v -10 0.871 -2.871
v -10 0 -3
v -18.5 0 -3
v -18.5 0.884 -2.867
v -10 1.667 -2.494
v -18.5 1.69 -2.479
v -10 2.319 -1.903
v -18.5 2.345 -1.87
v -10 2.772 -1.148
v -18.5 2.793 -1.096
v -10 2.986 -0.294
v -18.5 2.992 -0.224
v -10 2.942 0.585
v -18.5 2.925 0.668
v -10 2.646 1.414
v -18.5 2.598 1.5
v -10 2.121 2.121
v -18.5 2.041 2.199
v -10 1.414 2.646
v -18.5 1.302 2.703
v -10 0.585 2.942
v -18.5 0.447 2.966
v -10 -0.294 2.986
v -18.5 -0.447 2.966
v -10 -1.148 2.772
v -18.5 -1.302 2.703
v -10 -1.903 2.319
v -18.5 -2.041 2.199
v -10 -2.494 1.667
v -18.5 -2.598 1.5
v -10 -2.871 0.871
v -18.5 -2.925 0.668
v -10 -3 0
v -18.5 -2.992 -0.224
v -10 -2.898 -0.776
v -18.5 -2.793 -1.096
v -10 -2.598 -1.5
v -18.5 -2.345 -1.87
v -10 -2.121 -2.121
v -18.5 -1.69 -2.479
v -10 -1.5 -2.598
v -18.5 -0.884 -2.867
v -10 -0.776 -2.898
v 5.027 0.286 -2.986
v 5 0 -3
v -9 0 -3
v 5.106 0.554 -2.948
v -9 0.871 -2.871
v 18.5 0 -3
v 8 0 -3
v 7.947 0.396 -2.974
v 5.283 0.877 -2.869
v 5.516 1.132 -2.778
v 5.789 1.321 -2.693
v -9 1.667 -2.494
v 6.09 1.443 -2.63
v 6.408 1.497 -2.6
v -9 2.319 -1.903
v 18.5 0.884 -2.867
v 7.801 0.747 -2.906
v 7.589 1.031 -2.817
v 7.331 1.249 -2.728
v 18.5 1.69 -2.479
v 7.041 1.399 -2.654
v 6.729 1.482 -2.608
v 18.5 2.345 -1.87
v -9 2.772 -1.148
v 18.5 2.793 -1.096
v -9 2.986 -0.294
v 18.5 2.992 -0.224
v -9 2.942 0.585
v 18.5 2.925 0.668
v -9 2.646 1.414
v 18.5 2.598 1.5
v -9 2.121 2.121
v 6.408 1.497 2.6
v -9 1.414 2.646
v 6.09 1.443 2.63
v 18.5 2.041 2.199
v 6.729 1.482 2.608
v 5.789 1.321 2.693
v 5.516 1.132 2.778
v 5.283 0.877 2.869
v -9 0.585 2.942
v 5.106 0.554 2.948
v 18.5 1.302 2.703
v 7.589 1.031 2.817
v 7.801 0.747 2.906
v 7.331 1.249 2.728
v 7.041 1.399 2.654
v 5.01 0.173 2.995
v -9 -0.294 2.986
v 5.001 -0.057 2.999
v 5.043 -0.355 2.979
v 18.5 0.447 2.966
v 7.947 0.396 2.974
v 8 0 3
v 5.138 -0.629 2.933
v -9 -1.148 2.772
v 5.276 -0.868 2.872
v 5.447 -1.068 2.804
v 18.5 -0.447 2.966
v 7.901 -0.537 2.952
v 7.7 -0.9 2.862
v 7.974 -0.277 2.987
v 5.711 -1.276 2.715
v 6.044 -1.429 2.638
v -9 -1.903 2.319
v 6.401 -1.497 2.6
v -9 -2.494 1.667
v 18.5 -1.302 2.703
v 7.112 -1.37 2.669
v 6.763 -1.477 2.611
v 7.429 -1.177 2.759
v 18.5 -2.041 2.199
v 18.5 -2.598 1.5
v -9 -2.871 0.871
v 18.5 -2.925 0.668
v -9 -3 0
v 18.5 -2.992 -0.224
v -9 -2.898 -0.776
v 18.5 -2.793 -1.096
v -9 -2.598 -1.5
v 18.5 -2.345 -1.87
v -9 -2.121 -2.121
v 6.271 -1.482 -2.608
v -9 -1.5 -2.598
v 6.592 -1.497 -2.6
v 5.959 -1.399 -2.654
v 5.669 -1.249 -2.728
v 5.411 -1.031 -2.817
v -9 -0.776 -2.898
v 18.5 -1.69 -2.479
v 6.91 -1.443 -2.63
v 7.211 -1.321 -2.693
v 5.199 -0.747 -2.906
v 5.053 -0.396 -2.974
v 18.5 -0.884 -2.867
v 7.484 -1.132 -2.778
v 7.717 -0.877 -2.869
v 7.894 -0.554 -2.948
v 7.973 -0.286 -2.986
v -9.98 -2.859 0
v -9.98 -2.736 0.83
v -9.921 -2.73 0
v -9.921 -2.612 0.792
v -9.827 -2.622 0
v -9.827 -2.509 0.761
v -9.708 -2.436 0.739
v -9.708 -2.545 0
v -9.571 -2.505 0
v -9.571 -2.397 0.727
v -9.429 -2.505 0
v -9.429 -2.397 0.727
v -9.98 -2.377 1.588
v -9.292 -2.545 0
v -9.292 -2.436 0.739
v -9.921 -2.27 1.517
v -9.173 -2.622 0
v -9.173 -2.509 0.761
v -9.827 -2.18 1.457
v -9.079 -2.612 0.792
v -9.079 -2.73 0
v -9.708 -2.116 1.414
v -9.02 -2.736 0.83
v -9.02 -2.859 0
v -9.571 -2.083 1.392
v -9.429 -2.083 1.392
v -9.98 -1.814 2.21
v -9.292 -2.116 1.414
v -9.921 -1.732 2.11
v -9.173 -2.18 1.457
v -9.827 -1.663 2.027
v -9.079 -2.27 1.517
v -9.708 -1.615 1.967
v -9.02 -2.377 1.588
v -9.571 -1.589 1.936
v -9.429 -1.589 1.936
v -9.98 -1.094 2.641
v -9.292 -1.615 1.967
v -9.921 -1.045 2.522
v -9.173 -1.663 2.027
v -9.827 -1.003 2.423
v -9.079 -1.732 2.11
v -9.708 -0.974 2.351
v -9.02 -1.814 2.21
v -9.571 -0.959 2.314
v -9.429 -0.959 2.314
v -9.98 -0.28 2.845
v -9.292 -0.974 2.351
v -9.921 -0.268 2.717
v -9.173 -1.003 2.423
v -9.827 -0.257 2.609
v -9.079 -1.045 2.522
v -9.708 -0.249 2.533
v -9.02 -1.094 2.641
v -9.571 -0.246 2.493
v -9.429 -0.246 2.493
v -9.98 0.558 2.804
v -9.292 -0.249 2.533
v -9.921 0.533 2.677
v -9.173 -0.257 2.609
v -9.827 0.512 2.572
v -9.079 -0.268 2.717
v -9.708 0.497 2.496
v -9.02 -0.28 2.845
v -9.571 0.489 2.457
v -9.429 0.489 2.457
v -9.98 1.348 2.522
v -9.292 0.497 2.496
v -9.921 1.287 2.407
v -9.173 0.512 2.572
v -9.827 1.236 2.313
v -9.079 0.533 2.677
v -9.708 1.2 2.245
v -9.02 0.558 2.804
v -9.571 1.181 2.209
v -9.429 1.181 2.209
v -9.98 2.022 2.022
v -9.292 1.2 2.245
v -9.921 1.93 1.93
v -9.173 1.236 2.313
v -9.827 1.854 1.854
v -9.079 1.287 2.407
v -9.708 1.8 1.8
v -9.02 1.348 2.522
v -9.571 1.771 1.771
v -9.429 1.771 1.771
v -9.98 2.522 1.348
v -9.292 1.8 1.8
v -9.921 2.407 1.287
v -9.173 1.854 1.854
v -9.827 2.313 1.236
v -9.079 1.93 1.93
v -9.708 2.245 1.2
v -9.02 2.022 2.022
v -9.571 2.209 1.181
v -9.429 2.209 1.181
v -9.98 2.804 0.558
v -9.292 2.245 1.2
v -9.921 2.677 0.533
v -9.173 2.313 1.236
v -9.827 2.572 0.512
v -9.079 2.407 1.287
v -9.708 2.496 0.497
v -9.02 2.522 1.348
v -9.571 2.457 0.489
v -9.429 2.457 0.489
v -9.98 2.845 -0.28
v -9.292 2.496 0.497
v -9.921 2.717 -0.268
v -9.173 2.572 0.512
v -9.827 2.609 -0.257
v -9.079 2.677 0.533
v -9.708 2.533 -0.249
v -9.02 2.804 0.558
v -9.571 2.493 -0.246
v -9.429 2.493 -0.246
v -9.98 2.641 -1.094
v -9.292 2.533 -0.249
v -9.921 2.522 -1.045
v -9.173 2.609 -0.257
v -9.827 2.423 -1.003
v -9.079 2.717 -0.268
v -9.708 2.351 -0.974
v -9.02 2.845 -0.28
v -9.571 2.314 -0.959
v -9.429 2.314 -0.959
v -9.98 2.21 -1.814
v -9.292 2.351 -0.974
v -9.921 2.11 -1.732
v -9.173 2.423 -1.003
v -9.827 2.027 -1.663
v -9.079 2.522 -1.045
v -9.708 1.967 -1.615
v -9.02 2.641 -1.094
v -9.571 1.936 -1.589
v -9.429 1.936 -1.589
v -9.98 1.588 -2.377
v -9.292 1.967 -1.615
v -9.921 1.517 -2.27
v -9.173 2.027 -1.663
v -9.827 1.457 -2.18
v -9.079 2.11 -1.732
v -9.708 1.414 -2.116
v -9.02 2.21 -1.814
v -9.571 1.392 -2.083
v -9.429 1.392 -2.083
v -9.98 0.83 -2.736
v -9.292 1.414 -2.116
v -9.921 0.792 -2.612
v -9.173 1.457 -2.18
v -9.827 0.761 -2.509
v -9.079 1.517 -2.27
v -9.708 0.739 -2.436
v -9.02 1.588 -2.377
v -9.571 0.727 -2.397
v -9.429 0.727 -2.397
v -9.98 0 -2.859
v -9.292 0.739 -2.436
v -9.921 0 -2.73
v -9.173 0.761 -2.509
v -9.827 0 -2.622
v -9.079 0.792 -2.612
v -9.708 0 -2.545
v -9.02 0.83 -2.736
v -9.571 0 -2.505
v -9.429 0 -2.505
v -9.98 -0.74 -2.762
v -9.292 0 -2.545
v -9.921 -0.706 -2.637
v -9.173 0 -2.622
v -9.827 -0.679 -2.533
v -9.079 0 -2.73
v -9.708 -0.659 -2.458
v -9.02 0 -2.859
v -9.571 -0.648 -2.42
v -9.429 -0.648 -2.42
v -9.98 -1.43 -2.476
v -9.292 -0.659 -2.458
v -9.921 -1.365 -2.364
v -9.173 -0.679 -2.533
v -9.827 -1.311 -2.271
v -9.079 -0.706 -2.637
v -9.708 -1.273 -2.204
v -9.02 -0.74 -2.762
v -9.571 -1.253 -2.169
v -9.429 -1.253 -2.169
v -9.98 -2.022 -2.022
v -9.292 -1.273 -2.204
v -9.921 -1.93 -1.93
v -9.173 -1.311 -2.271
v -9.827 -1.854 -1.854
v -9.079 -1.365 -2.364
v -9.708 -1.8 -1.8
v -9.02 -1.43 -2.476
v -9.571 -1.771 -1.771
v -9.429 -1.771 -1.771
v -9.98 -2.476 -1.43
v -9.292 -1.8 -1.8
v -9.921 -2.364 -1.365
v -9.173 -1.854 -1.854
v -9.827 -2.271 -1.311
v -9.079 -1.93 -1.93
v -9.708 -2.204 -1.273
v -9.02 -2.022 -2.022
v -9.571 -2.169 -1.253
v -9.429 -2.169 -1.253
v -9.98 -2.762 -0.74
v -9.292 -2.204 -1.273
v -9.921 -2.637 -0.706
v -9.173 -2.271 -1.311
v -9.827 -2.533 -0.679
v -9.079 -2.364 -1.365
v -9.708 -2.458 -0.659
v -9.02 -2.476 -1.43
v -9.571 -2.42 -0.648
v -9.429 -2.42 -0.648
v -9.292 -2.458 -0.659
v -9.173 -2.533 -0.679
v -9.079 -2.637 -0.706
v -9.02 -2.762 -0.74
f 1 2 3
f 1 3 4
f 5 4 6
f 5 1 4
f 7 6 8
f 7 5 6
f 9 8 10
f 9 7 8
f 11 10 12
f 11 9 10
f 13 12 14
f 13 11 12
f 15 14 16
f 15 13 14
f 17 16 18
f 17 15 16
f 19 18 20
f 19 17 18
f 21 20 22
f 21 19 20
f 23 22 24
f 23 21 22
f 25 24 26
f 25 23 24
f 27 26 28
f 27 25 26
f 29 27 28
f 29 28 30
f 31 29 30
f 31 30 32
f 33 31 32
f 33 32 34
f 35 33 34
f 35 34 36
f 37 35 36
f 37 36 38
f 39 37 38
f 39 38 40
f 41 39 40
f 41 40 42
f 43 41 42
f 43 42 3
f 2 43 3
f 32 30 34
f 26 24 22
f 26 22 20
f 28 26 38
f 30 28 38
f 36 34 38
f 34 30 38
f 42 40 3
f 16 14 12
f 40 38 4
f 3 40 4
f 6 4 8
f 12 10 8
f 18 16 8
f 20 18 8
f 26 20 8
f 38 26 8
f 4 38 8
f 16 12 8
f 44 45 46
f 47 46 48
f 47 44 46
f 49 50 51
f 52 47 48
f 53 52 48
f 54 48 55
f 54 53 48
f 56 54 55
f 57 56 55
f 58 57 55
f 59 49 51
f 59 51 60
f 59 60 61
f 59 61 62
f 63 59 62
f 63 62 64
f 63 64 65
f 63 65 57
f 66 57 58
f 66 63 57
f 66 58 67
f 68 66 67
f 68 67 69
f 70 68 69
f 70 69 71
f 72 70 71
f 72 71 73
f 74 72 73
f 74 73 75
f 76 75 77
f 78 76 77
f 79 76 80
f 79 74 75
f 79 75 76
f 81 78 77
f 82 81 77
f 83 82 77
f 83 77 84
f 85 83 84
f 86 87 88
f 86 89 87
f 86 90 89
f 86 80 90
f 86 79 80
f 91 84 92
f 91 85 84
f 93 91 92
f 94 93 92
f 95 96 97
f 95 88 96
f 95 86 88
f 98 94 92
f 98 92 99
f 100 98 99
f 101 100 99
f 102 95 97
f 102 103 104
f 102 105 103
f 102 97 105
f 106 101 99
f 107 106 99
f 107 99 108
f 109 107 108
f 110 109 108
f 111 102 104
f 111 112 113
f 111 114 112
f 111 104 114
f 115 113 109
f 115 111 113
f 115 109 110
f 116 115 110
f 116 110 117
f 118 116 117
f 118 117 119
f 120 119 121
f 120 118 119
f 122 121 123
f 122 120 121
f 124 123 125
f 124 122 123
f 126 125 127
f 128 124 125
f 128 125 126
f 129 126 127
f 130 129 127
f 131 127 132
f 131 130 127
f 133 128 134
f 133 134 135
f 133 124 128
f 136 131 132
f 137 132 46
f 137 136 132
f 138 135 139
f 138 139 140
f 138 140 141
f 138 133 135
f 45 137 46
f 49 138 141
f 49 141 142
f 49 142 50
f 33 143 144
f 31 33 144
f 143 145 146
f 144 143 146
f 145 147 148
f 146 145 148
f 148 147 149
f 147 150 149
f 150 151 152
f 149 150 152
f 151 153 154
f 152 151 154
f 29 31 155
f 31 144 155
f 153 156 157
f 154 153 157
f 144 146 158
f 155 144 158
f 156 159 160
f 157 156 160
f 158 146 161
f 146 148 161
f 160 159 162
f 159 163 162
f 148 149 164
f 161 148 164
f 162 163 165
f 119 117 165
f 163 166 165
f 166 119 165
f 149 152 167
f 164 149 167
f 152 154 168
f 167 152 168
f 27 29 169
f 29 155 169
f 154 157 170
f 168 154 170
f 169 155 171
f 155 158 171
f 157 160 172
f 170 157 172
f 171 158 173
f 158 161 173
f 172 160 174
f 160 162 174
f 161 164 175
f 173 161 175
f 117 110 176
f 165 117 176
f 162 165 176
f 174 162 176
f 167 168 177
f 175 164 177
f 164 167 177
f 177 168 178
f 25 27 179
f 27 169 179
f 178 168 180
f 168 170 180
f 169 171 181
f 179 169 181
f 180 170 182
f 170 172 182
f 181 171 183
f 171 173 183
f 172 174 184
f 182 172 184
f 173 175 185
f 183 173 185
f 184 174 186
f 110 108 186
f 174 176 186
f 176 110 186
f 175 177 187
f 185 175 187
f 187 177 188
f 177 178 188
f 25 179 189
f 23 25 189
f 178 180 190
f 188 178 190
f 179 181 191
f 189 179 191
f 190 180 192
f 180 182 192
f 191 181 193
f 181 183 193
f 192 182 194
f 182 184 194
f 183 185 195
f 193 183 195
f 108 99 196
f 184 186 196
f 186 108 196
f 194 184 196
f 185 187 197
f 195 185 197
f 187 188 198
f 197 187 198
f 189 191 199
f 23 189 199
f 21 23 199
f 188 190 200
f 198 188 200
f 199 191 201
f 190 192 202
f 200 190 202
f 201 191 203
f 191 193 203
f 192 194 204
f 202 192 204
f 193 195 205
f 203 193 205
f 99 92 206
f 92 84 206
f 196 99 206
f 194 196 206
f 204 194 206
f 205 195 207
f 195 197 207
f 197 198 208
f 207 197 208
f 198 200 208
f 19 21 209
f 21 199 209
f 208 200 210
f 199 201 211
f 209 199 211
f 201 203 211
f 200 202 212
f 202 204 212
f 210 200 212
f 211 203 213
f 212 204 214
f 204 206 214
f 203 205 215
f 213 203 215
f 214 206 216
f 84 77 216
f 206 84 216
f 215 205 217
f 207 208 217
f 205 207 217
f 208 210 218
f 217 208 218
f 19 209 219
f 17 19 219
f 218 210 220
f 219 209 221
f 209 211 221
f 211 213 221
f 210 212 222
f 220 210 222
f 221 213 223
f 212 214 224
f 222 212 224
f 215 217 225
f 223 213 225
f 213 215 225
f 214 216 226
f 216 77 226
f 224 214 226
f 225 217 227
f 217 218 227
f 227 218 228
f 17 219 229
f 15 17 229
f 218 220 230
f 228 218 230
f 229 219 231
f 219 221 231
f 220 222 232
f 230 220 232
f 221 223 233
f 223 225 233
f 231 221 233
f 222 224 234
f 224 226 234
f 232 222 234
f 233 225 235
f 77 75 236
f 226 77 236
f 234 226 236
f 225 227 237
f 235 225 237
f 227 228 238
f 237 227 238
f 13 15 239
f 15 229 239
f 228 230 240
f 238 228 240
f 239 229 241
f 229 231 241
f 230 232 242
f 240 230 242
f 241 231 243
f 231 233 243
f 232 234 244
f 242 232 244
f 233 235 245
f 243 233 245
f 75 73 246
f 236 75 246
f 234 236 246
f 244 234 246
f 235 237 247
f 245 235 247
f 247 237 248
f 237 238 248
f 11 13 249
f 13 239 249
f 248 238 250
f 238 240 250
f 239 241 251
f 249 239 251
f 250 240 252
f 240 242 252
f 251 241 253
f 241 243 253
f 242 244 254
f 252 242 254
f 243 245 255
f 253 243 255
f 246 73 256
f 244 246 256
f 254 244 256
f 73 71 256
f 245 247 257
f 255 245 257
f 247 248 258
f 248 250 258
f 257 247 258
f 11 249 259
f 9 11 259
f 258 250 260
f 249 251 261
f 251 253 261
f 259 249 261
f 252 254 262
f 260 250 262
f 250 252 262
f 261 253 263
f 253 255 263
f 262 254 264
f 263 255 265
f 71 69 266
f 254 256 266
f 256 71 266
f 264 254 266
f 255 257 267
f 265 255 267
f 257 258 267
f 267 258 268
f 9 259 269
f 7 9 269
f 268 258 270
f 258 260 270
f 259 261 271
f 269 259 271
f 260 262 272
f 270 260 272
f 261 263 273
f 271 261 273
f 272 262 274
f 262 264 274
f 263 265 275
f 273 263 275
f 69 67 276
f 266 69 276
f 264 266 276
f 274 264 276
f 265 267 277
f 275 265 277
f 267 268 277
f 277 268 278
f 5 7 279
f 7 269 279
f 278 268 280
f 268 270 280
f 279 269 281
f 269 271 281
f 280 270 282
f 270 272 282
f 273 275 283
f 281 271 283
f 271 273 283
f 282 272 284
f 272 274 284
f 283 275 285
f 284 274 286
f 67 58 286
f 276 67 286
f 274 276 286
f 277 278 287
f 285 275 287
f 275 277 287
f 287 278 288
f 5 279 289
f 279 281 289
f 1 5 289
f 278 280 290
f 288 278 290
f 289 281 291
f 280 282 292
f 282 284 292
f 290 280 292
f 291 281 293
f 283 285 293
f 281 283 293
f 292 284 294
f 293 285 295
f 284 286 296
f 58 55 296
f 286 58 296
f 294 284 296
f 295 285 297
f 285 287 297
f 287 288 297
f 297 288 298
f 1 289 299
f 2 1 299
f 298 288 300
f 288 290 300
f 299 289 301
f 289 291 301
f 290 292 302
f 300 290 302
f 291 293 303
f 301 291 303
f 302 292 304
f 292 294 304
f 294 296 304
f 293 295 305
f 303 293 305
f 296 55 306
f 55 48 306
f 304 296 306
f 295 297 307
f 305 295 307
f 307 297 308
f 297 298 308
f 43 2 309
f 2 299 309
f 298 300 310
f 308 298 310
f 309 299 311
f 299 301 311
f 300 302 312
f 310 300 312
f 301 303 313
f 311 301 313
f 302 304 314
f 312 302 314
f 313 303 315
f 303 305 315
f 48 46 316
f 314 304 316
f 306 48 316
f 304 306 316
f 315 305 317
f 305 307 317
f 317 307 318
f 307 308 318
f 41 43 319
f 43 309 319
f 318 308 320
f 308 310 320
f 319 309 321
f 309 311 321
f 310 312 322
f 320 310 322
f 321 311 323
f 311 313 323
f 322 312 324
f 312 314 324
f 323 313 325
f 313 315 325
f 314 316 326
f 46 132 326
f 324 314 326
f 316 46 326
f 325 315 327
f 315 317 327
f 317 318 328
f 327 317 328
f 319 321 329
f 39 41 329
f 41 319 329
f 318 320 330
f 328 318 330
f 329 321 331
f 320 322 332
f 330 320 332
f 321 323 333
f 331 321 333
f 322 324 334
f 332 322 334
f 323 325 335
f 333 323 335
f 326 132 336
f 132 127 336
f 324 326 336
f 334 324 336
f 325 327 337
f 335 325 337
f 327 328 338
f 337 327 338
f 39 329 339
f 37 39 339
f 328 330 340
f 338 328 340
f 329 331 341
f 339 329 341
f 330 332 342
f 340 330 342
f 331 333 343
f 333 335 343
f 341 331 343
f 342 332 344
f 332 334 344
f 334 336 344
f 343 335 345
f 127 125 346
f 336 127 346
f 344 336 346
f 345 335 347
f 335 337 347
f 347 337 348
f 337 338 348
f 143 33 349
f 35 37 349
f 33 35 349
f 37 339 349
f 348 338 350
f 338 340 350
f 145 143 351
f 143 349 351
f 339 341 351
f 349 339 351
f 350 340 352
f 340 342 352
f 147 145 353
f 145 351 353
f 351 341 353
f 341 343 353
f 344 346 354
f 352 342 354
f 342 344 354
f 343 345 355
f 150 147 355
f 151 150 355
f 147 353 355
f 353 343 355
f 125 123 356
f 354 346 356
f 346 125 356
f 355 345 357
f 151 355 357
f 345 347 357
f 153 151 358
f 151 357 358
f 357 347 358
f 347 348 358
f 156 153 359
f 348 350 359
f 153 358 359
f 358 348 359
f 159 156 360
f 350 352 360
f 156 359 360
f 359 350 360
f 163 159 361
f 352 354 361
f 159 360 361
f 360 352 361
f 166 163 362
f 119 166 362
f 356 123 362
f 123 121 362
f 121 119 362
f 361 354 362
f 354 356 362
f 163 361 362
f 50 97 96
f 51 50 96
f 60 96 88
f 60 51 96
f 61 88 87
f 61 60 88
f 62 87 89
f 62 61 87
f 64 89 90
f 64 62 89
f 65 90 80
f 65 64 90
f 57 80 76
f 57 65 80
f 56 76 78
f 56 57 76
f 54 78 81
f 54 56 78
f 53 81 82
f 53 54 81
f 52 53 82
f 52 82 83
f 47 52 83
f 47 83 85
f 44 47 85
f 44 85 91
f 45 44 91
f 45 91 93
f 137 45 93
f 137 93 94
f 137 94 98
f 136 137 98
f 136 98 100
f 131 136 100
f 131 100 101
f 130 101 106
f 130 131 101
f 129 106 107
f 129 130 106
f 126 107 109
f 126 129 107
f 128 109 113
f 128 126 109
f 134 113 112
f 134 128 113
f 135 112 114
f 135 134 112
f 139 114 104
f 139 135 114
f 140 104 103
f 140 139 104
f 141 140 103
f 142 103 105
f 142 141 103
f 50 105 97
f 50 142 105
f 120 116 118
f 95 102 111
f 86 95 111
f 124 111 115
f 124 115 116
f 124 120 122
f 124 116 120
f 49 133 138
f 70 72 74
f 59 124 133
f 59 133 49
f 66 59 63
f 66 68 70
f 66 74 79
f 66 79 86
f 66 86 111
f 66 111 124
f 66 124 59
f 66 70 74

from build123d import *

# Parameters (mm, degrees)
SKETCH1_R               = 3
BOSS_EXTRUDE1_DEPTH     = 18.5
CUT_EXTRUDE1_DEPTH      = 19.980252896
CUT_EXTRUDE1_DEPTH_BACK = 19.980252896
SKETCH2_R               = 1.5
CUT_SWEEP1_PROFILE_R    = 0.5


with BuildPart() as part:
    # Sketch1 → Boss-Extrude1 (new, symmetric)
    with BuildSketch(Plane.YZ):
        with Locations(Location((0, 0, 0), (0, 0, 270))):
            Circle(SKETCH1_R)
    extrude(amount=BOSS_EXTRUDE1_DEPTH, both=True)

    # Sketch2 → Cut-Extrude1 (cut, two sides: drawn at the far end of the back side and taken through both)
    with BuildSketch(Plane(origin=(0, 0, 0), x_dir=(0, 1, 0), z_dir=(0, 0, 1)).offset(-CUT_EXTRUDE1_DEPTH_BACK)):
        with Locations(Location((0, -6.5, 0), (0, 0, 270))):
            Circle(SKETCH2_R)
    extrude(amount=CUT_EXTRUDE1_DEPTH + CUT_EXTRUDE1_DEPTH_BACK, mode=Mode.SUBTRACT)

    # Cut-Sweep1: sweep along a path in Sketch3
    with BuildLine(Plane(origin=(-9.5, 0, 0), x_dir=(0, -1, 0), z_dir=(-1, 0, 0))) as cut_sweep1_path:
        CenterArc((0, 0), 3, 0, 360)
    # Cut-Sweep1 profile (on start of the path) → Cut-Sweep1 (sweep, cut)
    with BuildSketch(Plane(origin=(-9.5, -3, 0), x_dir=(1, 0, 0), z_dir=(0, 0, 1))):
        Circle(CUT_SWEEP1_PROFILE_R)
    sweep(path=cut_sweep1_path.line, mode=Mode.SUBTRACT)


solid = part.part
